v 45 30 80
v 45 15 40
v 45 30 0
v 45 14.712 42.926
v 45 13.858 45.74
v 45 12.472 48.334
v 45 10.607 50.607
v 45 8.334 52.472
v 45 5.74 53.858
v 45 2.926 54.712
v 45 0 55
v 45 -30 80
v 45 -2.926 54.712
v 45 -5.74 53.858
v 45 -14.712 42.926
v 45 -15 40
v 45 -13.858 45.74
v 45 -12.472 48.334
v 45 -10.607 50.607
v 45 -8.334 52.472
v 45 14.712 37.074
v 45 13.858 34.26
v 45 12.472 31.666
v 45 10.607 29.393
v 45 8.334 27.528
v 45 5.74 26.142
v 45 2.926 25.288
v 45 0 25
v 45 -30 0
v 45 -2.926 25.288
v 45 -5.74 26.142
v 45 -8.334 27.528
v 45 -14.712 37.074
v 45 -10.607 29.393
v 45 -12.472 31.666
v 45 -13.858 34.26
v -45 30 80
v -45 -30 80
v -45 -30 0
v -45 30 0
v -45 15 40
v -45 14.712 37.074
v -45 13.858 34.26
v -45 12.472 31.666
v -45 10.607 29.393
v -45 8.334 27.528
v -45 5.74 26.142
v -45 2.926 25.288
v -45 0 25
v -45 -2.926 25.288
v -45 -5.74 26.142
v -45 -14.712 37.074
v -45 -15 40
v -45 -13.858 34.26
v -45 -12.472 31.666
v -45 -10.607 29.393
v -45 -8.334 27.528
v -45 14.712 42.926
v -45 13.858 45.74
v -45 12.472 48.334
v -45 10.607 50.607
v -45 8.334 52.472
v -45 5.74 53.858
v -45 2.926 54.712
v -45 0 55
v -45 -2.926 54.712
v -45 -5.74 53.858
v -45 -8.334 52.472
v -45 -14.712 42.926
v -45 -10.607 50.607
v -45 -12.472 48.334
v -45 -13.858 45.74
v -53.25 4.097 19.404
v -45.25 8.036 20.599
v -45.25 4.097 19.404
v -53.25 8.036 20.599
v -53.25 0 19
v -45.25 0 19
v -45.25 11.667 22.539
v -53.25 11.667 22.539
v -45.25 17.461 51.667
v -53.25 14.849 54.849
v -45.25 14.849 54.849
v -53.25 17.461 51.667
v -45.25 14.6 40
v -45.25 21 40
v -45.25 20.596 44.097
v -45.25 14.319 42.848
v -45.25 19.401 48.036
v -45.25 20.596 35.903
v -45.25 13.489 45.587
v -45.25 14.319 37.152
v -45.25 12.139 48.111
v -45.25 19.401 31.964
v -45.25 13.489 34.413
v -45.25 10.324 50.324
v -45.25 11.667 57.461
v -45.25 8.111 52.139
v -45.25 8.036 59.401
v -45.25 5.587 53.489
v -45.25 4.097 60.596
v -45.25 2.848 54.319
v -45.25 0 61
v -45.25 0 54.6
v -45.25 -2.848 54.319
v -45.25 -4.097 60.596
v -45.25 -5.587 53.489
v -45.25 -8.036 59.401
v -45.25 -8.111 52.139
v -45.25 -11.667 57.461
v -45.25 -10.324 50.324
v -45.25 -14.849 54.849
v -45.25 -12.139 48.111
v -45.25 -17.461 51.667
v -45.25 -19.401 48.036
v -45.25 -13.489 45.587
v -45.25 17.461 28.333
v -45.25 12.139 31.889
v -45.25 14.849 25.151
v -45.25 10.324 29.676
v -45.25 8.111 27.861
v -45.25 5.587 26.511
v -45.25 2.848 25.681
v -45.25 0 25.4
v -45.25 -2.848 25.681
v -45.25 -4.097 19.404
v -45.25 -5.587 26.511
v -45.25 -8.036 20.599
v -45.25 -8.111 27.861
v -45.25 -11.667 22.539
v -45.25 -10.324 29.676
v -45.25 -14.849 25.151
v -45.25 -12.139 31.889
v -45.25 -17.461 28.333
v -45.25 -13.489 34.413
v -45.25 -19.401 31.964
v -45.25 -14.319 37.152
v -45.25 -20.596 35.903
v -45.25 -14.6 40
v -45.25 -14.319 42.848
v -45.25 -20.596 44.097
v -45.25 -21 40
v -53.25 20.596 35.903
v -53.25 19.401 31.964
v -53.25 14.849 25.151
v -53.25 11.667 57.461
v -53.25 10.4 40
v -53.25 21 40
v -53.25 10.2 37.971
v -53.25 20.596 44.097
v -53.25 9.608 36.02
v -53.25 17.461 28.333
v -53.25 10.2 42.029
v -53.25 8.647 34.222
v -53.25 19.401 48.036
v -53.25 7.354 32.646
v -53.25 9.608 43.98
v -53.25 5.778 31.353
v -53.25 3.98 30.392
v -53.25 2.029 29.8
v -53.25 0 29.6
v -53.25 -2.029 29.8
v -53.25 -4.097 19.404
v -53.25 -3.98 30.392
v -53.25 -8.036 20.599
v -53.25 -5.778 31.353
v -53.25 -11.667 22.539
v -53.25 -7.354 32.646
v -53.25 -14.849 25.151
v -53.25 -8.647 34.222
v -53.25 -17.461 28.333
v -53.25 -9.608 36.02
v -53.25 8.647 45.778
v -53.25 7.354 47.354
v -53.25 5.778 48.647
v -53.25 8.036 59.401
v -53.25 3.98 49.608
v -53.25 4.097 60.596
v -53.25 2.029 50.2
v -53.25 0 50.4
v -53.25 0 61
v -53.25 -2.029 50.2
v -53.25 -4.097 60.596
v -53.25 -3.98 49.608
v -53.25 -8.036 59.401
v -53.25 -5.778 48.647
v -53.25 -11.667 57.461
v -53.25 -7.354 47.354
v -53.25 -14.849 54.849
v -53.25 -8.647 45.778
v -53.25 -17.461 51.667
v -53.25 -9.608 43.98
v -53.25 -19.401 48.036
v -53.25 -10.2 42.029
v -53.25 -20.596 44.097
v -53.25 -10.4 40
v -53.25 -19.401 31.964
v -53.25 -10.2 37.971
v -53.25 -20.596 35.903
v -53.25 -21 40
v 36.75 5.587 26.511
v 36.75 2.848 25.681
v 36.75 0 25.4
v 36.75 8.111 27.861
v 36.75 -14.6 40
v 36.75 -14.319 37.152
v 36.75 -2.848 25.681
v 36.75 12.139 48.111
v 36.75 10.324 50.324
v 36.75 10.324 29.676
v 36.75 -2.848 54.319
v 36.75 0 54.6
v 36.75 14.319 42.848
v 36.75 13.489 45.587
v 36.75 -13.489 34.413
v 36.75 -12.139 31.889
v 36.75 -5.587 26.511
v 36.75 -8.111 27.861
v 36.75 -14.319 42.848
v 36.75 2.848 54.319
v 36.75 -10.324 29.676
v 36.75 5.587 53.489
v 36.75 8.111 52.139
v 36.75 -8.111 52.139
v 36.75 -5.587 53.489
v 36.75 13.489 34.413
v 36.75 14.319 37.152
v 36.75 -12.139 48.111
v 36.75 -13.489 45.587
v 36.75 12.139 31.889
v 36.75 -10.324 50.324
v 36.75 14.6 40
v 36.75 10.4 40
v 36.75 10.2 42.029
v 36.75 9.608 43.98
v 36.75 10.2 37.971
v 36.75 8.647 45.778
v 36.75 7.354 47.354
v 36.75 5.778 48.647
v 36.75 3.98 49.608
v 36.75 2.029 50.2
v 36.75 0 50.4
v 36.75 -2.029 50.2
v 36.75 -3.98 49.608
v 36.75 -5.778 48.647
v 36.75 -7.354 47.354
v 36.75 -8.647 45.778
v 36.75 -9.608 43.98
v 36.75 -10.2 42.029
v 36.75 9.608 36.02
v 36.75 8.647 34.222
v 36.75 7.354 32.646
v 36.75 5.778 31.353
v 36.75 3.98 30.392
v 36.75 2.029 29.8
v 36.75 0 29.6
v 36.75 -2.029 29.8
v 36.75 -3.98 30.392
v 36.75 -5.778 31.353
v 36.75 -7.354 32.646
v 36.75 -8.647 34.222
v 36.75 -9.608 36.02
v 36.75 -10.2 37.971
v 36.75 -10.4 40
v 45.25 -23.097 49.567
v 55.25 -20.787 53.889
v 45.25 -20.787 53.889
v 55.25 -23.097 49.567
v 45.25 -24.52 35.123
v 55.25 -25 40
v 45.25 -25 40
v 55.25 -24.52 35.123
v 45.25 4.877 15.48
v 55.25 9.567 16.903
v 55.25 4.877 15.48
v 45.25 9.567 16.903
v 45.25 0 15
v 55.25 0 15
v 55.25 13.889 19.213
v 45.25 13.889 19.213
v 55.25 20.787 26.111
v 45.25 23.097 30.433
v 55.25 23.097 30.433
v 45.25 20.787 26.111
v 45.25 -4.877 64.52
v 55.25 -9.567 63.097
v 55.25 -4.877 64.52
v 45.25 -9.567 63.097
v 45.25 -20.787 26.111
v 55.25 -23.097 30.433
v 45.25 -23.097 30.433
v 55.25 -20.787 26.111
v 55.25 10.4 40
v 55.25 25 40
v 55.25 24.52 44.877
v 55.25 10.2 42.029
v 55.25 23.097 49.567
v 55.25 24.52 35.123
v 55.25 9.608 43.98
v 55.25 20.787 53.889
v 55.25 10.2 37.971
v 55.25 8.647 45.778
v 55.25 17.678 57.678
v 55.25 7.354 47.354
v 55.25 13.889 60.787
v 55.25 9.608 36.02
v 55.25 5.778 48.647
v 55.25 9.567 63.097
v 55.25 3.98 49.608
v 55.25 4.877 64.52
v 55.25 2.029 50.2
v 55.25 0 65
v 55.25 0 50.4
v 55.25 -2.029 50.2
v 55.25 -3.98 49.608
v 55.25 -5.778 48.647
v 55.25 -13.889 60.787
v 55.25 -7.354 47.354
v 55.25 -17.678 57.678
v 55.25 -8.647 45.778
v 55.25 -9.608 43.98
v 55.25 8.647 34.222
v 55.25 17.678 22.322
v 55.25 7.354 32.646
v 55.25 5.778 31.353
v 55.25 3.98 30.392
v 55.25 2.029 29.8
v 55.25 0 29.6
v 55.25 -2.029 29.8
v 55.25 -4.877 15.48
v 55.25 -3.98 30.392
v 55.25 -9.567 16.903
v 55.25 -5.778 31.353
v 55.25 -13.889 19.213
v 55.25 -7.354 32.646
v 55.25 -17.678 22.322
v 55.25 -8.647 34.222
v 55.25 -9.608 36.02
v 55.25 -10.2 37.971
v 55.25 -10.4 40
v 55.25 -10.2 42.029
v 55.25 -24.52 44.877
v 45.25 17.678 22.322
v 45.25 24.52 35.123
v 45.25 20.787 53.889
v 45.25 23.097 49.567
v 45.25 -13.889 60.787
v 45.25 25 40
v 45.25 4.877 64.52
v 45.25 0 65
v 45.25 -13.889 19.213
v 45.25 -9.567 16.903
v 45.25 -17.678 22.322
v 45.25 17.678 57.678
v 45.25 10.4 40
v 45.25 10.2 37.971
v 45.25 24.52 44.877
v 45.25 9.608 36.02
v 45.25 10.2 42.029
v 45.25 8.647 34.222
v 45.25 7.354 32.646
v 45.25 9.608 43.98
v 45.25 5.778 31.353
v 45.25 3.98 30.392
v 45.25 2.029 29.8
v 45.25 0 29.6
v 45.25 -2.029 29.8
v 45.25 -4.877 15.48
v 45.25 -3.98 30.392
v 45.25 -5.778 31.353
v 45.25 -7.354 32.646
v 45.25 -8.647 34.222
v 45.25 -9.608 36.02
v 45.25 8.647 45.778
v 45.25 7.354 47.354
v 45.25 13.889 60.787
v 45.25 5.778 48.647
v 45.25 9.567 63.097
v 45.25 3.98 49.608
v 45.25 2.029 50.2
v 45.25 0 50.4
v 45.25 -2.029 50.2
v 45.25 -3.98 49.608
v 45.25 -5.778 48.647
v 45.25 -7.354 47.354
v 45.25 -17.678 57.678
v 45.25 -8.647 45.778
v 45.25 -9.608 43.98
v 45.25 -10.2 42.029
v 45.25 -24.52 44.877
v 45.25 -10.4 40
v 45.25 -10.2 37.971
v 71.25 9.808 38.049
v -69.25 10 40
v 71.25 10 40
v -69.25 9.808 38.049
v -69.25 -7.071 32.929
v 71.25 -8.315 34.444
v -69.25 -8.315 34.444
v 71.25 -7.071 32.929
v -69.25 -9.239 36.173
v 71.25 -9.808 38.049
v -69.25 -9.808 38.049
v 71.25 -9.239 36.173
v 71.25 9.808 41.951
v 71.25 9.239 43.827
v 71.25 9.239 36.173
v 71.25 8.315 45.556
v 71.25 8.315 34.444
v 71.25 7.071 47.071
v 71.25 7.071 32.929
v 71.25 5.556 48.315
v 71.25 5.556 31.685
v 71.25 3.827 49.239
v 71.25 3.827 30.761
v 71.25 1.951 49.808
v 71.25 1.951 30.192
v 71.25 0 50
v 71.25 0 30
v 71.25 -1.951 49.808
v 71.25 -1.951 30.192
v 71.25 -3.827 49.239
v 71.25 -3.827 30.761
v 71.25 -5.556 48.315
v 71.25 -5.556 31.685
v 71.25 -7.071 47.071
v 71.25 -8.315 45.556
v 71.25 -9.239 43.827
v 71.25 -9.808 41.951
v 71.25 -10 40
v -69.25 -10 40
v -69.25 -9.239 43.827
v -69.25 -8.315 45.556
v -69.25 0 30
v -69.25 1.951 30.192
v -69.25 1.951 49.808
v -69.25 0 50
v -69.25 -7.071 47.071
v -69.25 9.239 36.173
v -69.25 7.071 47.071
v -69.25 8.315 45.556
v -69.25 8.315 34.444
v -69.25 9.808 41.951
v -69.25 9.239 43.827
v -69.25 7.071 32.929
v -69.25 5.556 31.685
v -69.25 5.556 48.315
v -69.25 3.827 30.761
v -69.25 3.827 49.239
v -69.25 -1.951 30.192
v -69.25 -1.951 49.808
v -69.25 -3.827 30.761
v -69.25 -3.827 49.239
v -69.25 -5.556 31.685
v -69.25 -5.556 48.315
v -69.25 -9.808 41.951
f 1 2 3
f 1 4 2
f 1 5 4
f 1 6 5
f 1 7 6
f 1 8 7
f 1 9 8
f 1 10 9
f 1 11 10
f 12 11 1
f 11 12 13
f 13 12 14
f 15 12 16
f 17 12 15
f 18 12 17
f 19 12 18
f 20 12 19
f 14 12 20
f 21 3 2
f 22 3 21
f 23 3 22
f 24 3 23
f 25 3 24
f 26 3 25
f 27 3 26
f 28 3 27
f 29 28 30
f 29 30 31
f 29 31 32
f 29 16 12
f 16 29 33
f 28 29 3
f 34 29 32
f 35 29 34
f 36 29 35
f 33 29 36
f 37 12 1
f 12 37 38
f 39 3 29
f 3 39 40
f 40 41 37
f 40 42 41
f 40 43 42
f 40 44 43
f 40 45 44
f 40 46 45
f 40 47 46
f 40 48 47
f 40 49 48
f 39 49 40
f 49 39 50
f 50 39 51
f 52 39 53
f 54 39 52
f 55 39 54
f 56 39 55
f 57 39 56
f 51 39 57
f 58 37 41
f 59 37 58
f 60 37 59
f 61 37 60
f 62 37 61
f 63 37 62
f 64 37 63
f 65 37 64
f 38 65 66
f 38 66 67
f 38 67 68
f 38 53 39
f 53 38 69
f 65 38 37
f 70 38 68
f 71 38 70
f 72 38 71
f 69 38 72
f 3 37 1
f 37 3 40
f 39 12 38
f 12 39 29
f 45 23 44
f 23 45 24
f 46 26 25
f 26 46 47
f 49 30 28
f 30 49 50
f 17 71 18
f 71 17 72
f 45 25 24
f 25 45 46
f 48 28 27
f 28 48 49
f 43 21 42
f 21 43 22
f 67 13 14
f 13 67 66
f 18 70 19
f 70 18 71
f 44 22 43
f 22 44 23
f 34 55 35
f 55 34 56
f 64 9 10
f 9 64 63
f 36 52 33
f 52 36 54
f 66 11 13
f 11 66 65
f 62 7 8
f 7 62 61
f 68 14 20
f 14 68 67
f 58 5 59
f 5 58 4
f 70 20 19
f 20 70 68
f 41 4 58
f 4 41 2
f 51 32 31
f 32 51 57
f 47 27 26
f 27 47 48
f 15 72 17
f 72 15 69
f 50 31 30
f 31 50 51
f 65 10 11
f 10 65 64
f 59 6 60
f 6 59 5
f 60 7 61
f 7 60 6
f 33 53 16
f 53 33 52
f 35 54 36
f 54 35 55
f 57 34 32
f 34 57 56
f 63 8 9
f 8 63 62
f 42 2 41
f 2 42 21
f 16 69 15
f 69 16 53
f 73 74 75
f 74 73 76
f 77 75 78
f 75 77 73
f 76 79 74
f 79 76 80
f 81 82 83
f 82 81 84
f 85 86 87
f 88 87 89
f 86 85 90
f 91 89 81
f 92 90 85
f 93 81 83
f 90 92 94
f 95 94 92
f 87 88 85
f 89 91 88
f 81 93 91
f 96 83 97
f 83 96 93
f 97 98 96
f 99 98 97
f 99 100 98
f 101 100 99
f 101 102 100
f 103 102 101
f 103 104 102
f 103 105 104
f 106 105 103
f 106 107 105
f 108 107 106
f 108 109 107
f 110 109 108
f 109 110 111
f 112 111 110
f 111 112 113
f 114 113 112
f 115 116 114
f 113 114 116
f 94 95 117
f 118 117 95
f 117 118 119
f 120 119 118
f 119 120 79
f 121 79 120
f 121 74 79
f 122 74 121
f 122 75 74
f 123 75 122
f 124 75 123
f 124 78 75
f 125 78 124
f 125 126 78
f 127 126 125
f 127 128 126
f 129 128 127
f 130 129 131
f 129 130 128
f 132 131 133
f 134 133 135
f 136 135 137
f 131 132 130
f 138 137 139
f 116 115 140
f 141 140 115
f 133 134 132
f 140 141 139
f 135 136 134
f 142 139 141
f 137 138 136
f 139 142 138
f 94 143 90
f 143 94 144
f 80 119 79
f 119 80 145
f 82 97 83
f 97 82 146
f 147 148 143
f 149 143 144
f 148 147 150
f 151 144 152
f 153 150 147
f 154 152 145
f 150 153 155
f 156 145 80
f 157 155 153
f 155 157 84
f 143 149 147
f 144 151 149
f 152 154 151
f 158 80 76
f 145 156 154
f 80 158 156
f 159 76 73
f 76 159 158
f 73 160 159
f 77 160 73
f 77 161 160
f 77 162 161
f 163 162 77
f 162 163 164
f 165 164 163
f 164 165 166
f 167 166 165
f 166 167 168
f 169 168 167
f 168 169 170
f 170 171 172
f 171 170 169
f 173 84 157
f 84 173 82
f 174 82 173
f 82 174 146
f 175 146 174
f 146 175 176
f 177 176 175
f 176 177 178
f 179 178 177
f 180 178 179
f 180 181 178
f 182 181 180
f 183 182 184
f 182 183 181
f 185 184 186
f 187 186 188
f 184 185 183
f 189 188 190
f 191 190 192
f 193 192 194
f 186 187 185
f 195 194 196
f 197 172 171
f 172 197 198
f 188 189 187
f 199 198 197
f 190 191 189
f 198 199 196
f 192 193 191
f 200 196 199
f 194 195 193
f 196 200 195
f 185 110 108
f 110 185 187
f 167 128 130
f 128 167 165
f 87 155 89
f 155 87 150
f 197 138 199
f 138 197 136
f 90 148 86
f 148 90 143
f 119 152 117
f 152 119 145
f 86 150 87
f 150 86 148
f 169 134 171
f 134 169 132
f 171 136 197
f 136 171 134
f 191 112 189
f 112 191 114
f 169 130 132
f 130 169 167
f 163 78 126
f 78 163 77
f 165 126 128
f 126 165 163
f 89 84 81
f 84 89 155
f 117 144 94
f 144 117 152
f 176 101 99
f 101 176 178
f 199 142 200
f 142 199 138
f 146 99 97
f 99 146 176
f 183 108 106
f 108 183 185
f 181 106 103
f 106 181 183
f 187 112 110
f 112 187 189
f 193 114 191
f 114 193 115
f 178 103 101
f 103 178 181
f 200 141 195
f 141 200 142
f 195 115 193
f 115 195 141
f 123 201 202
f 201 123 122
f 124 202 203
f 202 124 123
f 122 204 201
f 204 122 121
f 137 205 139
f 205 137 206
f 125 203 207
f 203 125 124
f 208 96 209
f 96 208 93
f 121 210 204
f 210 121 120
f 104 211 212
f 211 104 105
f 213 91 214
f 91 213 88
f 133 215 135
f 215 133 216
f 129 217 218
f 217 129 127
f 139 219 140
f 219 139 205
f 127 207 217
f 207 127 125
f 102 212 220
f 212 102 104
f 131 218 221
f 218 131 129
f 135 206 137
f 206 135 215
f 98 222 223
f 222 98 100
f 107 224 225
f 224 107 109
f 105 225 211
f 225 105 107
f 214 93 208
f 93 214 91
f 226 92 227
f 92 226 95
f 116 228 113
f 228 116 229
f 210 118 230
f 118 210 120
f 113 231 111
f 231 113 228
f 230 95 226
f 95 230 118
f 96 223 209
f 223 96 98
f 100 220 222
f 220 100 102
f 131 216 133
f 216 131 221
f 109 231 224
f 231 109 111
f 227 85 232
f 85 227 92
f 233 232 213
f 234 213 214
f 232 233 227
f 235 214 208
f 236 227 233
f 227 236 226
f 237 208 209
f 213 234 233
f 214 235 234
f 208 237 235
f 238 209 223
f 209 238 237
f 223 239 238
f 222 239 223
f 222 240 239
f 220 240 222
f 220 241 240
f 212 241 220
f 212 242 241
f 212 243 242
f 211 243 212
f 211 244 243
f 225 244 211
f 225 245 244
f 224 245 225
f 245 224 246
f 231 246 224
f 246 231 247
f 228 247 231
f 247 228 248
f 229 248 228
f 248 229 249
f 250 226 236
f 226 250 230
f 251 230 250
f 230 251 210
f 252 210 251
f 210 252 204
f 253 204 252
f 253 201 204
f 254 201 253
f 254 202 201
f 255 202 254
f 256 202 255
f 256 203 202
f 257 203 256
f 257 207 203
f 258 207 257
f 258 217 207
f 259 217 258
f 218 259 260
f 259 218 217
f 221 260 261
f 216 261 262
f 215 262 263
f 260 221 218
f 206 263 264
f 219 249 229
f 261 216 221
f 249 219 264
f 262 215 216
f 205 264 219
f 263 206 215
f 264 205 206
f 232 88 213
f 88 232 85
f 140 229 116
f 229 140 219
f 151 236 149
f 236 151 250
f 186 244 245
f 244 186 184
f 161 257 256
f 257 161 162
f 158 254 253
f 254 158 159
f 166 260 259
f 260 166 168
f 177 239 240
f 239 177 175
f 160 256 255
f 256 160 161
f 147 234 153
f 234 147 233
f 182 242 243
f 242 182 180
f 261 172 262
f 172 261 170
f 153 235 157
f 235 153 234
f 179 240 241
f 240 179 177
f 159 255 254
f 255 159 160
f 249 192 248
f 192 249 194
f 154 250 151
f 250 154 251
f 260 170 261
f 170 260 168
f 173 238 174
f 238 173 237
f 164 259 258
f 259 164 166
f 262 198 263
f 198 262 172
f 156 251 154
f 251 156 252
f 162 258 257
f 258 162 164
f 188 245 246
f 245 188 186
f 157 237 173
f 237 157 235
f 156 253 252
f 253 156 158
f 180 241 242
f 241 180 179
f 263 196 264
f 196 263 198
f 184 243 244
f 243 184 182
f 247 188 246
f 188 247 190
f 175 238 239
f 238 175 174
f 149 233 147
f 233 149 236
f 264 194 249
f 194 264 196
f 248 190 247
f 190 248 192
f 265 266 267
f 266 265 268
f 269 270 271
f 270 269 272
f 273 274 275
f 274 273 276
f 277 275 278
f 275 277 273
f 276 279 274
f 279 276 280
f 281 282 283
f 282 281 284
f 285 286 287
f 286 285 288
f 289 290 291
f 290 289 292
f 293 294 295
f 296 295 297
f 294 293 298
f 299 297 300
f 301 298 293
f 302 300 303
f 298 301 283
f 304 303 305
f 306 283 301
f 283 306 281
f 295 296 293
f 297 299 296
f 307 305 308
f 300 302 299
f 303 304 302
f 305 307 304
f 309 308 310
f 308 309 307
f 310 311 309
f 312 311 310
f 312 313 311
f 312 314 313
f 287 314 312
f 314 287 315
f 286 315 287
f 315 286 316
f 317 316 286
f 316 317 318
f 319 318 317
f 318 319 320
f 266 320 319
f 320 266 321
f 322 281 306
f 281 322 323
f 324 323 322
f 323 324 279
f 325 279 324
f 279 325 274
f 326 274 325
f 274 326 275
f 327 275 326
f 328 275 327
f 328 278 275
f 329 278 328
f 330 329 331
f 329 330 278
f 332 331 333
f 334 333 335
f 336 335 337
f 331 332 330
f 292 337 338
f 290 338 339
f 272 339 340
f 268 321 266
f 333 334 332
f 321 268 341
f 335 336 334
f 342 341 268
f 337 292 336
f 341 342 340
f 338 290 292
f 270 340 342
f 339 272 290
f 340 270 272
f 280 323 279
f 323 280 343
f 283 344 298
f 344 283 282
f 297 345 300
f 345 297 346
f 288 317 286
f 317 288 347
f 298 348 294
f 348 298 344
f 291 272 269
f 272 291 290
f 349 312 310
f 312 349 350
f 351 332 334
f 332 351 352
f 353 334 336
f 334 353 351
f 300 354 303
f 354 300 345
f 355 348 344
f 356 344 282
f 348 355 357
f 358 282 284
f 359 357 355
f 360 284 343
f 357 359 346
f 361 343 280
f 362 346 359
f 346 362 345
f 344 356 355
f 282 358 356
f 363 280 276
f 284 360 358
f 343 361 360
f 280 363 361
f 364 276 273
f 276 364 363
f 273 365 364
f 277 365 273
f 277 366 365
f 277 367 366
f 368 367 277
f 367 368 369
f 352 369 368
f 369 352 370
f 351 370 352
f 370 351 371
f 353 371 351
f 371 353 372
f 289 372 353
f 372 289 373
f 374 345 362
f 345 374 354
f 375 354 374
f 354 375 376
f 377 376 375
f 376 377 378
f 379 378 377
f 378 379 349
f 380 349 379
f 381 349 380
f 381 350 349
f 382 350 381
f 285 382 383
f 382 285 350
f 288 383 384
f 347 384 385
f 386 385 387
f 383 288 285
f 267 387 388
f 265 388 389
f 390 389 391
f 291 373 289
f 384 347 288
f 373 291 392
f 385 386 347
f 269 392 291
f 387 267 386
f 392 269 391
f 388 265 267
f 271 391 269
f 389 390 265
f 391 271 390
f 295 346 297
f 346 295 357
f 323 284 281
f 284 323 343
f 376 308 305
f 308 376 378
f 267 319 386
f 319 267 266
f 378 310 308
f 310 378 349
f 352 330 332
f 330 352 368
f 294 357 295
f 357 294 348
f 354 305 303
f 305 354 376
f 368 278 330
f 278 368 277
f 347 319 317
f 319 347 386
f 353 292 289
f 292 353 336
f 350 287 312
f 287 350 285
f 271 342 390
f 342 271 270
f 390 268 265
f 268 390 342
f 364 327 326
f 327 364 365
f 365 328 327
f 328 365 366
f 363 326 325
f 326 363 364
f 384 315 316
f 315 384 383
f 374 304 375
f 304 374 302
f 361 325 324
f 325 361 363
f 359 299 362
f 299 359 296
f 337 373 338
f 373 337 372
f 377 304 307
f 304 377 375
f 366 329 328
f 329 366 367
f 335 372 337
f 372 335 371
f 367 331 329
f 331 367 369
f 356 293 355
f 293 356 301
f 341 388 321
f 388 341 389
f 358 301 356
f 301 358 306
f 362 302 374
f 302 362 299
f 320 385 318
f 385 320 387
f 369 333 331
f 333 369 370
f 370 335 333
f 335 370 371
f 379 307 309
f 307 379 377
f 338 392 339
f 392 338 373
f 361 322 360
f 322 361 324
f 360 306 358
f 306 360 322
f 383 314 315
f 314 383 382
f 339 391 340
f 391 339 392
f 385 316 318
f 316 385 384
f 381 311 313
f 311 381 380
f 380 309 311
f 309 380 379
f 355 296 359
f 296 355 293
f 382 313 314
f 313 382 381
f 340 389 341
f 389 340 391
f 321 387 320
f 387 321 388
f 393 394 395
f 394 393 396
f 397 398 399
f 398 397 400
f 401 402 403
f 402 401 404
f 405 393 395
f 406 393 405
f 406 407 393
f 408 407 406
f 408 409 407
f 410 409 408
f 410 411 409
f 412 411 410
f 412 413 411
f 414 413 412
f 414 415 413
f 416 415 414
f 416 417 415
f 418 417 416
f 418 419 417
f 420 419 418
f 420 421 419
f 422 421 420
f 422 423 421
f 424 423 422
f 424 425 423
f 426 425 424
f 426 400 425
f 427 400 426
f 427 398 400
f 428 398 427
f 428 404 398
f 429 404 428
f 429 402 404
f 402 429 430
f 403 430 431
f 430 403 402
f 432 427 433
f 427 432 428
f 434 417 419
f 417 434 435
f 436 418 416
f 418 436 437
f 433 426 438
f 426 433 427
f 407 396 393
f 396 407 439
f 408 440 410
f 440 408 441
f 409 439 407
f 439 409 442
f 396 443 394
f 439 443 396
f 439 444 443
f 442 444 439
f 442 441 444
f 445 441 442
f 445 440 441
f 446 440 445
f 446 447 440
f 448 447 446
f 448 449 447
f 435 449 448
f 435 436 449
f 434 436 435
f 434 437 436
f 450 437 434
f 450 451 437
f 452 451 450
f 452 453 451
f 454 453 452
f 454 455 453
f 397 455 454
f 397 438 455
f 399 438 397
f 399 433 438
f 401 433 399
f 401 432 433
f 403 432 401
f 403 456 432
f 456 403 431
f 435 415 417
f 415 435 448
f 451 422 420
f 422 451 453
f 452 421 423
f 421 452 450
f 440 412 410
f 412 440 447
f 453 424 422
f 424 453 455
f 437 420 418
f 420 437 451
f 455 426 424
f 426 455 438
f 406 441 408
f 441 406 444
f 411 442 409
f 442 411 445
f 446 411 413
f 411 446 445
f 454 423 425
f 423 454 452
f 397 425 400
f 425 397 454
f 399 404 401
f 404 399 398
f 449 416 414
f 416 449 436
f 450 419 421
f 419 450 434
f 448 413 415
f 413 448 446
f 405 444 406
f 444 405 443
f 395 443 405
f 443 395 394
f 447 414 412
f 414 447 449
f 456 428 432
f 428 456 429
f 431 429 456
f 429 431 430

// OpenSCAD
$fn = 32;

// ------------------------------------------------------------------------
// Bushed housing: 90 x 60 x 80 mm housing, bushing d29.2
// Every part is its own module, assembly() places them once.
// ------------------------------------------------------------------------

// --- part 1 ---
module housing() {
  difference() {
    translate([-45, -30, 0]) cube([90, 60, 80]);
    translate([0, 0, 40]) rotate([0, 90, 0]) cylinder(h = 92, d = 30, center = true);
  }
}

// --- part 2 ---
module bushing() {
  difference() {
    union() {
      cylinder(h = 8, d = 42);
      translate([0, 0, 8]) cylinder(h = 82, d = 29.2);
    }
    translate([0, 0, -1]) cylinder(h = 92, d = 20.8);
  }
}

// --- part 3 ---
module shaft() {
  translate([0, 0, -70.25]) cylinder(h = 140.5, d = 20);
}

// --- part 4 ---
module cover() {
  difference() {
    cylinder(h = 10, d = 50);
    translate([0, 0, -1]) cylinder(h = 12, d = 20.8);
  }
}

// --- assembly ---
module assembly() {
  translate([0, 0, 0]) rotate([0, 0, 0]) housing();
  translate([-53.25, 0, 40]) rotate([0, 90, 0]) bushing();
  translate([1, 0, 40]) rotate([0, 90, 0]) shaft();
  translate([45.25, 0, 40]) rotate([0, 90, 0]) cover();
}

assembly();
